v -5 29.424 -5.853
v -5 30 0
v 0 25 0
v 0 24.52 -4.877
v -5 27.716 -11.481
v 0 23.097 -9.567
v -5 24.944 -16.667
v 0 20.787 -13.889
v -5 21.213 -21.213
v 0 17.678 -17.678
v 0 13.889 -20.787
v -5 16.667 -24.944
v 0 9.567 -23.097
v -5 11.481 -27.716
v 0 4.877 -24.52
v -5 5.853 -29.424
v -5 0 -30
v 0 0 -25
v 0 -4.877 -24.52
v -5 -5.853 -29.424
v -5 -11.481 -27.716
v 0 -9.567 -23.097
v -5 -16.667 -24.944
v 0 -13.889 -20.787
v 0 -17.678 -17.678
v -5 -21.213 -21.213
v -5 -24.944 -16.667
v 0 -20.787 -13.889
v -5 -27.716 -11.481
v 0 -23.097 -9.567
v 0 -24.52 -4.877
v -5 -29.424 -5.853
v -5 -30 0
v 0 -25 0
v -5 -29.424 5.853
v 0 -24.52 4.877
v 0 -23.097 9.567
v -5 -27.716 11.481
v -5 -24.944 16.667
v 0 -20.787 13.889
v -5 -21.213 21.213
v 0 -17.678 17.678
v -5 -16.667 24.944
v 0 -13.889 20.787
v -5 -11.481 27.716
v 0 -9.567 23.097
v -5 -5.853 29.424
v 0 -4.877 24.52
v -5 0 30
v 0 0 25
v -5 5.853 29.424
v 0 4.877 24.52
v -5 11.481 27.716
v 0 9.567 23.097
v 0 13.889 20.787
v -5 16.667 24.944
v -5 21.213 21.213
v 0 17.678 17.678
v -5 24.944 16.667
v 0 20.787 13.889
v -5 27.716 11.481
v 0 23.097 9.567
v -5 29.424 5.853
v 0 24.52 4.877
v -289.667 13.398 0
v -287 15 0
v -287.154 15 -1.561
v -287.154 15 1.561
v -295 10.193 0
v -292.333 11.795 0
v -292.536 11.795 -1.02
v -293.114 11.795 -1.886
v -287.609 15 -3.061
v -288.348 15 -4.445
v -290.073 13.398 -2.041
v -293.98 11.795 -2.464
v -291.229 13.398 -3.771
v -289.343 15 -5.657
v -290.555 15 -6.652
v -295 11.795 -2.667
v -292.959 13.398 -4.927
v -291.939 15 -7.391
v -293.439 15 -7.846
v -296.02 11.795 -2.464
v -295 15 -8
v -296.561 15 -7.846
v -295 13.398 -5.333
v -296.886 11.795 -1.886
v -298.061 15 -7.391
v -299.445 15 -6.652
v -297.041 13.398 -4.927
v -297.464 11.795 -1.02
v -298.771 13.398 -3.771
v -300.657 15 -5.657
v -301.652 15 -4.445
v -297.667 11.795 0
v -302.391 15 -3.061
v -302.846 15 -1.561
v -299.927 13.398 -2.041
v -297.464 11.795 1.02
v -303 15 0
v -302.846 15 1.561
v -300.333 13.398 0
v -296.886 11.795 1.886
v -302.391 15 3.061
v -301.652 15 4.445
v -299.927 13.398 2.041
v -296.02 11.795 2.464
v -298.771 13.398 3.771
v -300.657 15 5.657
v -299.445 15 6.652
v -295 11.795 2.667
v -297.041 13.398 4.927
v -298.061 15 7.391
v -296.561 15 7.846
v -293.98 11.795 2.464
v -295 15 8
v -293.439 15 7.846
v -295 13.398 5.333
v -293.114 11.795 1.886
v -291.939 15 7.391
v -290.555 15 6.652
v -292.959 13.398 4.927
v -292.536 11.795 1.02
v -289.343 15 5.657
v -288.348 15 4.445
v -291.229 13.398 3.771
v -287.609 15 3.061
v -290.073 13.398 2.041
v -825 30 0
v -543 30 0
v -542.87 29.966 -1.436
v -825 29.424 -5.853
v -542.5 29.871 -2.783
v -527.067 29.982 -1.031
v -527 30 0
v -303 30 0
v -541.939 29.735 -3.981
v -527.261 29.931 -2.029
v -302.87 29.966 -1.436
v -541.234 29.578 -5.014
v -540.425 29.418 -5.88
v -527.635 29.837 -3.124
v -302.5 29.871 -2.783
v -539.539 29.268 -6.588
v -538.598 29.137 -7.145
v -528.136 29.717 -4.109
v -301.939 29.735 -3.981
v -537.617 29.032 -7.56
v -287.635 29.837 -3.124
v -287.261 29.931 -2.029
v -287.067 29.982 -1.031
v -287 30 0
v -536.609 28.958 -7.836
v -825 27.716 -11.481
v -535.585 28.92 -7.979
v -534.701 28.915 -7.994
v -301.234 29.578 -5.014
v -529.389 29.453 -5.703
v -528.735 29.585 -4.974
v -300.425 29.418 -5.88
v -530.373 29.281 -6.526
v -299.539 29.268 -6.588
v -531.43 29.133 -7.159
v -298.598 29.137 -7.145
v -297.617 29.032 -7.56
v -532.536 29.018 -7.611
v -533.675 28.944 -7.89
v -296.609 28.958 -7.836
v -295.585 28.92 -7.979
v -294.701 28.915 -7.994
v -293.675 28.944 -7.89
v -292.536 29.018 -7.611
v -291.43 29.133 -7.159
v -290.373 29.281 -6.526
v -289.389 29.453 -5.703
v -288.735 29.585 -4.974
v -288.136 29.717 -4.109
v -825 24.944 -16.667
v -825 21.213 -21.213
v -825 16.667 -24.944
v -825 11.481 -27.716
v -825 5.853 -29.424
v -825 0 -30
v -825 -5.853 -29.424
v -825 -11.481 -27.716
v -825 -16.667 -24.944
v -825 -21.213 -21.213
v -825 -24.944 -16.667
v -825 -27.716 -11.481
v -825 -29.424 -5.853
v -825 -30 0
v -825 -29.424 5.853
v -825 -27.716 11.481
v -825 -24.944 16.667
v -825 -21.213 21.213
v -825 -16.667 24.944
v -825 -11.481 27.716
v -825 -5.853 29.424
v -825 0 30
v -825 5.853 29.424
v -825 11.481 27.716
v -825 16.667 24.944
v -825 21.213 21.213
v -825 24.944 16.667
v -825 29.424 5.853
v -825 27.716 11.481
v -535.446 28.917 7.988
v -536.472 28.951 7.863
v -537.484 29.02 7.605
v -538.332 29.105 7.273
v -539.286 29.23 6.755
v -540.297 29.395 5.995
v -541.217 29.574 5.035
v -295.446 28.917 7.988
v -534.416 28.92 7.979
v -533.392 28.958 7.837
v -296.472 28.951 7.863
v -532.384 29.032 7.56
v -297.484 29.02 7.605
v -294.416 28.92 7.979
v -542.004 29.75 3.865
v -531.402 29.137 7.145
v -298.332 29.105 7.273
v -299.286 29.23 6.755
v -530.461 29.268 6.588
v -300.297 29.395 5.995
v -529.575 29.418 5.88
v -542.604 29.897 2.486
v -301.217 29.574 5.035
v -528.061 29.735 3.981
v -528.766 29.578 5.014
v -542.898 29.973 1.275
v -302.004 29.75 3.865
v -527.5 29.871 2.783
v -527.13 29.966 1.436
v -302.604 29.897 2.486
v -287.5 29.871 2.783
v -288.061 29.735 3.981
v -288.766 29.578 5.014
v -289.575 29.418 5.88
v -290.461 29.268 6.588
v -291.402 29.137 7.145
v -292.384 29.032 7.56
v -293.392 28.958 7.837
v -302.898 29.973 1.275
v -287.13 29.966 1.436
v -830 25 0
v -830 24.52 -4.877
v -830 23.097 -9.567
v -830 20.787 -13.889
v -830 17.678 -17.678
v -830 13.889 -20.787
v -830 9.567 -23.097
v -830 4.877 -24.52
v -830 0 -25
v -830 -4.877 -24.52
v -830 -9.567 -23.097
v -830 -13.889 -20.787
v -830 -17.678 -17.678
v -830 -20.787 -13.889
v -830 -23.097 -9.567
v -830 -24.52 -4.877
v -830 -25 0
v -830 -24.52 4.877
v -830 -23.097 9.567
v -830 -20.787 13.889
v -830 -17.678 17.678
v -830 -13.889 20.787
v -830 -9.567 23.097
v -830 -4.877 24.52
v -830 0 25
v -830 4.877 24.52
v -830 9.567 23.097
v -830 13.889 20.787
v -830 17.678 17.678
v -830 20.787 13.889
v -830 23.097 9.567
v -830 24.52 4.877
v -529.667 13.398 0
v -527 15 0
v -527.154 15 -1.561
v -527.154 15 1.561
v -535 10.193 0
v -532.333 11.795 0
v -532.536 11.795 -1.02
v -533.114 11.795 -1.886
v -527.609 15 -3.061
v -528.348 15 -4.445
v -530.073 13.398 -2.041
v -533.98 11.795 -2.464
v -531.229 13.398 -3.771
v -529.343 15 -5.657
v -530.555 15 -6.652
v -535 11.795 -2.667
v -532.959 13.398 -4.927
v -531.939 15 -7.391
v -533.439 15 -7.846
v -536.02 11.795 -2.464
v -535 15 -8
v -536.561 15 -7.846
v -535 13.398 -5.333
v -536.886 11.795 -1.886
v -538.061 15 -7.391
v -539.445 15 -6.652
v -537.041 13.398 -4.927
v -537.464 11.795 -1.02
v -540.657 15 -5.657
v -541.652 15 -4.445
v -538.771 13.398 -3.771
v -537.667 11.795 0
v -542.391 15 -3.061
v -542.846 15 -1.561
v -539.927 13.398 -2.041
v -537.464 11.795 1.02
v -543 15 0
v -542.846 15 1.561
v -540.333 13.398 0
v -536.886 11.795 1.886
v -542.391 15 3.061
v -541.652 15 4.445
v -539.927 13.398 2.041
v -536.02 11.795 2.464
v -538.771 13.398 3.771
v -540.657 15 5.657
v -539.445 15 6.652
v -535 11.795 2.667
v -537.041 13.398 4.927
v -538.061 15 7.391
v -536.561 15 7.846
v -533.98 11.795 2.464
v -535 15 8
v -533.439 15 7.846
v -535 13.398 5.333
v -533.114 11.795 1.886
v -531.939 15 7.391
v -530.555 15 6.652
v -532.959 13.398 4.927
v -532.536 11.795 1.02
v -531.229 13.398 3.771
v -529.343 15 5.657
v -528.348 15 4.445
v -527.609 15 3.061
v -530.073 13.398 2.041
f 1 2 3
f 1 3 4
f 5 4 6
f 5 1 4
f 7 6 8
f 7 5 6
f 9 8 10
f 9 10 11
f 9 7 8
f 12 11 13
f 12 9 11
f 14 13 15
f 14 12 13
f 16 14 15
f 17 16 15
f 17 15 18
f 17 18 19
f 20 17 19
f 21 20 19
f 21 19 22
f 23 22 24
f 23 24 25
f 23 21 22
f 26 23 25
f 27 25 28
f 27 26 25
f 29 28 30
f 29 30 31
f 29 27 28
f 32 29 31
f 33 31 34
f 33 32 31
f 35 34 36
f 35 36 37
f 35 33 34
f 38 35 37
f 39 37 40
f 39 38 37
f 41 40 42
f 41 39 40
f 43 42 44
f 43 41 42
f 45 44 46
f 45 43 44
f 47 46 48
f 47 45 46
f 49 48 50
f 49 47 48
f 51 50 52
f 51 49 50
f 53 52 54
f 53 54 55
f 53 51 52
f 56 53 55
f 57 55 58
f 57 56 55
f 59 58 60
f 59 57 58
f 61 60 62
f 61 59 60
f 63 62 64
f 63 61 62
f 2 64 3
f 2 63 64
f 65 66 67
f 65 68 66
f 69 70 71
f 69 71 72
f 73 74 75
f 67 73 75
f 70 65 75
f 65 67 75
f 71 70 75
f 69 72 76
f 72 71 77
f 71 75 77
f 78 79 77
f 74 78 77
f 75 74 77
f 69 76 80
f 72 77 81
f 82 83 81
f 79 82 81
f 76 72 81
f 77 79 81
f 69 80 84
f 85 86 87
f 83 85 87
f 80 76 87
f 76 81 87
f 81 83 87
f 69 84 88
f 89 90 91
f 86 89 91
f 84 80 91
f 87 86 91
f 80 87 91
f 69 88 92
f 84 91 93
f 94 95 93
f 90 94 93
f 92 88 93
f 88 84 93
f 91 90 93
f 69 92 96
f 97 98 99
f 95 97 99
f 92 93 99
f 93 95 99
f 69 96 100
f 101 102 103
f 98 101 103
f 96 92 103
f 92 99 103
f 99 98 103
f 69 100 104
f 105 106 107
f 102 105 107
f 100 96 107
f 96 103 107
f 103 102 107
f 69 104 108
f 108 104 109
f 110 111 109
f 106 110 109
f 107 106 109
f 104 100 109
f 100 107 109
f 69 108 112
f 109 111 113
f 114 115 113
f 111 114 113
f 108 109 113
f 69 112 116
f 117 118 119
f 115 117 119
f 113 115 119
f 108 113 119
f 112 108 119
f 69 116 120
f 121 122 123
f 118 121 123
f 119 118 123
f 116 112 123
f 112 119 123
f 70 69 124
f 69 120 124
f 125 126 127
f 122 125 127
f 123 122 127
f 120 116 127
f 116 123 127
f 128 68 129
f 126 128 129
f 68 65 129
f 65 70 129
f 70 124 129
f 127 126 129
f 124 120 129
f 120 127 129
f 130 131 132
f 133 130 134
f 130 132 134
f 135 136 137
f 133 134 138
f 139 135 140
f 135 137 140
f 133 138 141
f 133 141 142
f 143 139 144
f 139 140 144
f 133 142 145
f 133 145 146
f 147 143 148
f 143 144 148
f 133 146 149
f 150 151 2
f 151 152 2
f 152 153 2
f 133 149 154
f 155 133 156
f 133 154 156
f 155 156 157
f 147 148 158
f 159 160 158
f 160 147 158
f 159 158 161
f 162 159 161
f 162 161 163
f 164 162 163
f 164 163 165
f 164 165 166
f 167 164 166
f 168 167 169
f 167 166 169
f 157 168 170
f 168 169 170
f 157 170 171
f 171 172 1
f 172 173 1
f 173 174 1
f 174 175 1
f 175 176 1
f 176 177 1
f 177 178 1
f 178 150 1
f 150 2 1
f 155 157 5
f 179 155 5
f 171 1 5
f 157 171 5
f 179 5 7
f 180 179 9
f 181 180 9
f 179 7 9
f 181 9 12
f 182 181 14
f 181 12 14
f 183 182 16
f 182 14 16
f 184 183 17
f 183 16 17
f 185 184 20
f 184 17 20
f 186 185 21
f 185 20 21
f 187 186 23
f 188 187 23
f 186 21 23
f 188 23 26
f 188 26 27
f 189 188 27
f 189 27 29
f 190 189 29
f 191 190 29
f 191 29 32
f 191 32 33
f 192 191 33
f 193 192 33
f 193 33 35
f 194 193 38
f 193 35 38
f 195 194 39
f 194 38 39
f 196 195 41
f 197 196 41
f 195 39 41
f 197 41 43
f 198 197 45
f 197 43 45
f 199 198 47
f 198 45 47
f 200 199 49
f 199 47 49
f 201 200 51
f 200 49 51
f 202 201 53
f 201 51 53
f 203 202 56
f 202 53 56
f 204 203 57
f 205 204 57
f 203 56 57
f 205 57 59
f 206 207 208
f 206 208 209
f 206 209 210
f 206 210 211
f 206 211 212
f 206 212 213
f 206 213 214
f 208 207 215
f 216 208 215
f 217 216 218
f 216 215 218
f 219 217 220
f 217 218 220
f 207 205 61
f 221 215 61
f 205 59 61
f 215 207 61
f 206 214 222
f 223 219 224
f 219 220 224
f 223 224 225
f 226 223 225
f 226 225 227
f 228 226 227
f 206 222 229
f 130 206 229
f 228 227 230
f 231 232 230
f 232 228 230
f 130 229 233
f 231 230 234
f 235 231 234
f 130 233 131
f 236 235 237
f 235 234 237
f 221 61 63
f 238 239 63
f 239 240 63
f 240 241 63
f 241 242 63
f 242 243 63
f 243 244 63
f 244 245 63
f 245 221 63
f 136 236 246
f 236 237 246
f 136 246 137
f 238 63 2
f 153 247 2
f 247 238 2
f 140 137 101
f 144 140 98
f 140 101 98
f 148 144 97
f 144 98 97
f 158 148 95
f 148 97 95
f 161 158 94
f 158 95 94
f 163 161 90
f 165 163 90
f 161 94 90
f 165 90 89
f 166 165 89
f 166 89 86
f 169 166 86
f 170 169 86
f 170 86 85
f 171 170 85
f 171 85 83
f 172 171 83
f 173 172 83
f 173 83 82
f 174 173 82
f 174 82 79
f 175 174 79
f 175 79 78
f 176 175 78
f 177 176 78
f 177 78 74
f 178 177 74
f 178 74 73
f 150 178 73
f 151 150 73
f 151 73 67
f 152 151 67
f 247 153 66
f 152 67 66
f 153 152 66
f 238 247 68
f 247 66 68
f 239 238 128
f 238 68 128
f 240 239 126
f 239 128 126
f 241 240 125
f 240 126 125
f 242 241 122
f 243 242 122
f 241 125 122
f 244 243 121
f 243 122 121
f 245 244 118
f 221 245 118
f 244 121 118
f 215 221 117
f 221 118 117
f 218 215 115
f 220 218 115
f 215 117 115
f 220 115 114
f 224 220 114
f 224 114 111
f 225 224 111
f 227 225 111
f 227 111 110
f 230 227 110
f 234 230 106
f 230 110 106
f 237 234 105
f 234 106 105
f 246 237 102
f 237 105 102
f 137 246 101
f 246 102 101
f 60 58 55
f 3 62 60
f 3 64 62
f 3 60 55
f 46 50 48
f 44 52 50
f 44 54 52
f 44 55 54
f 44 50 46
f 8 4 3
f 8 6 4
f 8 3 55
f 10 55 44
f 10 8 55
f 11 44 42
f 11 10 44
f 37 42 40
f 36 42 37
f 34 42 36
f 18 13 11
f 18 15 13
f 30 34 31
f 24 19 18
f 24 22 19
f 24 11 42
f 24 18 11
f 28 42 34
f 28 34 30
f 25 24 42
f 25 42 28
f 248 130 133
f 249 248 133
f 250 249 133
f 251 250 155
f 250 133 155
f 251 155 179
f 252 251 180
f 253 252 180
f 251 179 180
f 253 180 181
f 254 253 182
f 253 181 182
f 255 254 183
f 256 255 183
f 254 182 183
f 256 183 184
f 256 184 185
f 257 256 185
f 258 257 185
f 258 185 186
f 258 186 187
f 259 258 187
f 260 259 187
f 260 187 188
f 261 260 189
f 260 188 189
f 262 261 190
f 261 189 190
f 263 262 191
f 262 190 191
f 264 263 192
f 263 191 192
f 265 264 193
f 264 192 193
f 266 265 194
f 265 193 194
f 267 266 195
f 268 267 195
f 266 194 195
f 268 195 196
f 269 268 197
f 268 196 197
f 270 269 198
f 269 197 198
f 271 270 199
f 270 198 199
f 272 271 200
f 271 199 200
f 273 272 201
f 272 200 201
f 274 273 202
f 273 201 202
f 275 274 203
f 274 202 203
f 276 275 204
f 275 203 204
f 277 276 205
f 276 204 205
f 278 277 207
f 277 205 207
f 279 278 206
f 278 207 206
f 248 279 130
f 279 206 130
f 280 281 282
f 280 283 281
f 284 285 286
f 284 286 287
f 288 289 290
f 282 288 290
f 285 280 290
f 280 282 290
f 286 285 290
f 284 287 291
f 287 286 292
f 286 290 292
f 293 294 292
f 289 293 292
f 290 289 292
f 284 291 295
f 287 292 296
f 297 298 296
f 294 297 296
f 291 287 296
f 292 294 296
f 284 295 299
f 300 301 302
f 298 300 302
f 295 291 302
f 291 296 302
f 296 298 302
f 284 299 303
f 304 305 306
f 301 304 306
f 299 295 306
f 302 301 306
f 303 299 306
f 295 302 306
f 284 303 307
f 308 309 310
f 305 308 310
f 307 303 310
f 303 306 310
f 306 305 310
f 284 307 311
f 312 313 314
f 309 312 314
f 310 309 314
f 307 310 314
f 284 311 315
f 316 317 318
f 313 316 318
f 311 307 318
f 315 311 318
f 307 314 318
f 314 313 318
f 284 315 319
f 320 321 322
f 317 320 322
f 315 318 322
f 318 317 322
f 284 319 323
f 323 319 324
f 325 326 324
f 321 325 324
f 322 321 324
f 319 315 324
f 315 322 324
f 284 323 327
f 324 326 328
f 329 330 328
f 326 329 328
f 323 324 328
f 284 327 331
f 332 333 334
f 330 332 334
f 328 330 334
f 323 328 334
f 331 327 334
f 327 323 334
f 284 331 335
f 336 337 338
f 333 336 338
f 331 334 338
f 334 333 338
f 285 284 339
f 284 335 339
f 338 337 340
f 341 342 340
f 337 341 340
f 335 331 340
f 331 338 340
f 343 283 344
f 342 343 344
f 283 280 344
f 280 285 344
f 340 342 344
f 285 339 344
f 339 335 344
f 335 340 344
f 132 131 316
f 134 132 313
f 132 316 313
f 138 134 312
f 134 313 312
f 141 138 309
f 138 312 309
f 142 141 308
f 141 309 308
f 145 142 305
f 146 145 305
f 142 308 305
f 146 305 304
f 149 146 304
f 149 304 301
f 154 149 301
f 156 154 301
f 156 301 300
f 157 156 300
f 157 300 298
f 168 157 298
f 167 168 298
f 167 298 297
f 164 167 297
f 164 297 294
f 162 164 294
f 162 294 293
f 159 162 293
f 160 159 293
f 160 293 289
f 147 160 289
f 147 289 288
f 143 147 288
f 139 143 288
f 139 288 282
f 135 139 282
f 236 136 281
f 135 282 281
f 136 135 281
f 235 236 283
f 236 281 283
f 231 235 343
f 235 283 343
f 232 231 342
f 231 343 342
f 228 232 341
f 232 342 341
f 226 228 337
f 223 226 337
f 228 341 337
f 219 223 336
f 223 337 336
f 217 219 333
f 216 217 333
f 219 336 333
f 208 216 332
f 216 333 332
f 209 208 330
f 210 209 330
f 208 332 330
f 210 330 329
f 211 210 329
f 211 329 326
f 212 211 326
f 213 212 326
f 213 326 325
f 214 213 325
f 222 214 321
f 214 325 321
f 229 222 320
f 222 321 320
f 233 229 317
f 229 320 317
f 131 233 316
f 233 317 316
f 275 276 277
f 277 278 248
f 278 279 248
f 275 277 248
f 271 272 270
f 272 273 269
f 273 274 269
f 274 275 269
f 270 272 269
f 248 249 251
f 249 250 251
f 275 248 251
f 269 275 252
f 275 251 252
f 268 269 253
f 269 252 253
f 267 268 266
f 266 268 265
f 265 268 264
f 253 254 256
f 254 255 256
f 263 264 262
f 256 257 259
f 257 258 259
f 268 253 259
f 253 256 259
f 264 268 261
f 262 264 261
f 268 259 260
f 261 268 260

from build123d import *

# Parameters (mm, degrees)
SKETCH_1_W                  = 830
SKETCH_1_H                  = 30
CHAMFER_1_SIZE              = 5
HOLE_WIZARD_16_0_16_1_D     = 16
HOLE_WIZARD_16_0_16_1_DEPTH = 15
HOLE_WIZARD_16_0_16_1_TIP   = 4.806884952


with BuildPart() as part:
    # 草图1 → 旋转1 (revolve)
    with BuildSketch(Plane.XY):
        with Locations((-415, 15)):
            Rectangle(SKETCH_1_W, SKETCH_1_H)
    revolve(axis=Axis((0, 0, 0), (-1, 0, 0)))

    # 倒角1
    chamfer_1_edges = [part.edges().sort_by_distance(p)[0] for p in [
        (0, -30, 0),
        (-830, -30, 0),
    ]]
    chamfer(chamfer_1_edges, length=CHAMFER_1_SIZE)

    # Ø16.0 (16) 直径孔1
    with Locations(Plane(origin=(0, 30, 0), x_dir=(1, 0, 0), z_dir=(0, 1, 0))):
        with Locations((-535, 0), (-295, 0)):
            Hole(HOLE_WIZARD_16_0_16_1_D / 2, depth=HOLE_WIZARD_16_0_16_1_DEPTH)
            with Locations((0, 0, -(HOLE_WIZARD_16_0_16_1_DEPTH + HOLE_WIZARD_16_0_16_1_TIP / 2))):  # 118° drill point
                Cone(0, HOLE_WIZARD_16_0_16_1_D / 2, HOLE_WIZARD_16_0_16_1_TIP, mode=Mode.SUBTRACT)


solid = part.part
